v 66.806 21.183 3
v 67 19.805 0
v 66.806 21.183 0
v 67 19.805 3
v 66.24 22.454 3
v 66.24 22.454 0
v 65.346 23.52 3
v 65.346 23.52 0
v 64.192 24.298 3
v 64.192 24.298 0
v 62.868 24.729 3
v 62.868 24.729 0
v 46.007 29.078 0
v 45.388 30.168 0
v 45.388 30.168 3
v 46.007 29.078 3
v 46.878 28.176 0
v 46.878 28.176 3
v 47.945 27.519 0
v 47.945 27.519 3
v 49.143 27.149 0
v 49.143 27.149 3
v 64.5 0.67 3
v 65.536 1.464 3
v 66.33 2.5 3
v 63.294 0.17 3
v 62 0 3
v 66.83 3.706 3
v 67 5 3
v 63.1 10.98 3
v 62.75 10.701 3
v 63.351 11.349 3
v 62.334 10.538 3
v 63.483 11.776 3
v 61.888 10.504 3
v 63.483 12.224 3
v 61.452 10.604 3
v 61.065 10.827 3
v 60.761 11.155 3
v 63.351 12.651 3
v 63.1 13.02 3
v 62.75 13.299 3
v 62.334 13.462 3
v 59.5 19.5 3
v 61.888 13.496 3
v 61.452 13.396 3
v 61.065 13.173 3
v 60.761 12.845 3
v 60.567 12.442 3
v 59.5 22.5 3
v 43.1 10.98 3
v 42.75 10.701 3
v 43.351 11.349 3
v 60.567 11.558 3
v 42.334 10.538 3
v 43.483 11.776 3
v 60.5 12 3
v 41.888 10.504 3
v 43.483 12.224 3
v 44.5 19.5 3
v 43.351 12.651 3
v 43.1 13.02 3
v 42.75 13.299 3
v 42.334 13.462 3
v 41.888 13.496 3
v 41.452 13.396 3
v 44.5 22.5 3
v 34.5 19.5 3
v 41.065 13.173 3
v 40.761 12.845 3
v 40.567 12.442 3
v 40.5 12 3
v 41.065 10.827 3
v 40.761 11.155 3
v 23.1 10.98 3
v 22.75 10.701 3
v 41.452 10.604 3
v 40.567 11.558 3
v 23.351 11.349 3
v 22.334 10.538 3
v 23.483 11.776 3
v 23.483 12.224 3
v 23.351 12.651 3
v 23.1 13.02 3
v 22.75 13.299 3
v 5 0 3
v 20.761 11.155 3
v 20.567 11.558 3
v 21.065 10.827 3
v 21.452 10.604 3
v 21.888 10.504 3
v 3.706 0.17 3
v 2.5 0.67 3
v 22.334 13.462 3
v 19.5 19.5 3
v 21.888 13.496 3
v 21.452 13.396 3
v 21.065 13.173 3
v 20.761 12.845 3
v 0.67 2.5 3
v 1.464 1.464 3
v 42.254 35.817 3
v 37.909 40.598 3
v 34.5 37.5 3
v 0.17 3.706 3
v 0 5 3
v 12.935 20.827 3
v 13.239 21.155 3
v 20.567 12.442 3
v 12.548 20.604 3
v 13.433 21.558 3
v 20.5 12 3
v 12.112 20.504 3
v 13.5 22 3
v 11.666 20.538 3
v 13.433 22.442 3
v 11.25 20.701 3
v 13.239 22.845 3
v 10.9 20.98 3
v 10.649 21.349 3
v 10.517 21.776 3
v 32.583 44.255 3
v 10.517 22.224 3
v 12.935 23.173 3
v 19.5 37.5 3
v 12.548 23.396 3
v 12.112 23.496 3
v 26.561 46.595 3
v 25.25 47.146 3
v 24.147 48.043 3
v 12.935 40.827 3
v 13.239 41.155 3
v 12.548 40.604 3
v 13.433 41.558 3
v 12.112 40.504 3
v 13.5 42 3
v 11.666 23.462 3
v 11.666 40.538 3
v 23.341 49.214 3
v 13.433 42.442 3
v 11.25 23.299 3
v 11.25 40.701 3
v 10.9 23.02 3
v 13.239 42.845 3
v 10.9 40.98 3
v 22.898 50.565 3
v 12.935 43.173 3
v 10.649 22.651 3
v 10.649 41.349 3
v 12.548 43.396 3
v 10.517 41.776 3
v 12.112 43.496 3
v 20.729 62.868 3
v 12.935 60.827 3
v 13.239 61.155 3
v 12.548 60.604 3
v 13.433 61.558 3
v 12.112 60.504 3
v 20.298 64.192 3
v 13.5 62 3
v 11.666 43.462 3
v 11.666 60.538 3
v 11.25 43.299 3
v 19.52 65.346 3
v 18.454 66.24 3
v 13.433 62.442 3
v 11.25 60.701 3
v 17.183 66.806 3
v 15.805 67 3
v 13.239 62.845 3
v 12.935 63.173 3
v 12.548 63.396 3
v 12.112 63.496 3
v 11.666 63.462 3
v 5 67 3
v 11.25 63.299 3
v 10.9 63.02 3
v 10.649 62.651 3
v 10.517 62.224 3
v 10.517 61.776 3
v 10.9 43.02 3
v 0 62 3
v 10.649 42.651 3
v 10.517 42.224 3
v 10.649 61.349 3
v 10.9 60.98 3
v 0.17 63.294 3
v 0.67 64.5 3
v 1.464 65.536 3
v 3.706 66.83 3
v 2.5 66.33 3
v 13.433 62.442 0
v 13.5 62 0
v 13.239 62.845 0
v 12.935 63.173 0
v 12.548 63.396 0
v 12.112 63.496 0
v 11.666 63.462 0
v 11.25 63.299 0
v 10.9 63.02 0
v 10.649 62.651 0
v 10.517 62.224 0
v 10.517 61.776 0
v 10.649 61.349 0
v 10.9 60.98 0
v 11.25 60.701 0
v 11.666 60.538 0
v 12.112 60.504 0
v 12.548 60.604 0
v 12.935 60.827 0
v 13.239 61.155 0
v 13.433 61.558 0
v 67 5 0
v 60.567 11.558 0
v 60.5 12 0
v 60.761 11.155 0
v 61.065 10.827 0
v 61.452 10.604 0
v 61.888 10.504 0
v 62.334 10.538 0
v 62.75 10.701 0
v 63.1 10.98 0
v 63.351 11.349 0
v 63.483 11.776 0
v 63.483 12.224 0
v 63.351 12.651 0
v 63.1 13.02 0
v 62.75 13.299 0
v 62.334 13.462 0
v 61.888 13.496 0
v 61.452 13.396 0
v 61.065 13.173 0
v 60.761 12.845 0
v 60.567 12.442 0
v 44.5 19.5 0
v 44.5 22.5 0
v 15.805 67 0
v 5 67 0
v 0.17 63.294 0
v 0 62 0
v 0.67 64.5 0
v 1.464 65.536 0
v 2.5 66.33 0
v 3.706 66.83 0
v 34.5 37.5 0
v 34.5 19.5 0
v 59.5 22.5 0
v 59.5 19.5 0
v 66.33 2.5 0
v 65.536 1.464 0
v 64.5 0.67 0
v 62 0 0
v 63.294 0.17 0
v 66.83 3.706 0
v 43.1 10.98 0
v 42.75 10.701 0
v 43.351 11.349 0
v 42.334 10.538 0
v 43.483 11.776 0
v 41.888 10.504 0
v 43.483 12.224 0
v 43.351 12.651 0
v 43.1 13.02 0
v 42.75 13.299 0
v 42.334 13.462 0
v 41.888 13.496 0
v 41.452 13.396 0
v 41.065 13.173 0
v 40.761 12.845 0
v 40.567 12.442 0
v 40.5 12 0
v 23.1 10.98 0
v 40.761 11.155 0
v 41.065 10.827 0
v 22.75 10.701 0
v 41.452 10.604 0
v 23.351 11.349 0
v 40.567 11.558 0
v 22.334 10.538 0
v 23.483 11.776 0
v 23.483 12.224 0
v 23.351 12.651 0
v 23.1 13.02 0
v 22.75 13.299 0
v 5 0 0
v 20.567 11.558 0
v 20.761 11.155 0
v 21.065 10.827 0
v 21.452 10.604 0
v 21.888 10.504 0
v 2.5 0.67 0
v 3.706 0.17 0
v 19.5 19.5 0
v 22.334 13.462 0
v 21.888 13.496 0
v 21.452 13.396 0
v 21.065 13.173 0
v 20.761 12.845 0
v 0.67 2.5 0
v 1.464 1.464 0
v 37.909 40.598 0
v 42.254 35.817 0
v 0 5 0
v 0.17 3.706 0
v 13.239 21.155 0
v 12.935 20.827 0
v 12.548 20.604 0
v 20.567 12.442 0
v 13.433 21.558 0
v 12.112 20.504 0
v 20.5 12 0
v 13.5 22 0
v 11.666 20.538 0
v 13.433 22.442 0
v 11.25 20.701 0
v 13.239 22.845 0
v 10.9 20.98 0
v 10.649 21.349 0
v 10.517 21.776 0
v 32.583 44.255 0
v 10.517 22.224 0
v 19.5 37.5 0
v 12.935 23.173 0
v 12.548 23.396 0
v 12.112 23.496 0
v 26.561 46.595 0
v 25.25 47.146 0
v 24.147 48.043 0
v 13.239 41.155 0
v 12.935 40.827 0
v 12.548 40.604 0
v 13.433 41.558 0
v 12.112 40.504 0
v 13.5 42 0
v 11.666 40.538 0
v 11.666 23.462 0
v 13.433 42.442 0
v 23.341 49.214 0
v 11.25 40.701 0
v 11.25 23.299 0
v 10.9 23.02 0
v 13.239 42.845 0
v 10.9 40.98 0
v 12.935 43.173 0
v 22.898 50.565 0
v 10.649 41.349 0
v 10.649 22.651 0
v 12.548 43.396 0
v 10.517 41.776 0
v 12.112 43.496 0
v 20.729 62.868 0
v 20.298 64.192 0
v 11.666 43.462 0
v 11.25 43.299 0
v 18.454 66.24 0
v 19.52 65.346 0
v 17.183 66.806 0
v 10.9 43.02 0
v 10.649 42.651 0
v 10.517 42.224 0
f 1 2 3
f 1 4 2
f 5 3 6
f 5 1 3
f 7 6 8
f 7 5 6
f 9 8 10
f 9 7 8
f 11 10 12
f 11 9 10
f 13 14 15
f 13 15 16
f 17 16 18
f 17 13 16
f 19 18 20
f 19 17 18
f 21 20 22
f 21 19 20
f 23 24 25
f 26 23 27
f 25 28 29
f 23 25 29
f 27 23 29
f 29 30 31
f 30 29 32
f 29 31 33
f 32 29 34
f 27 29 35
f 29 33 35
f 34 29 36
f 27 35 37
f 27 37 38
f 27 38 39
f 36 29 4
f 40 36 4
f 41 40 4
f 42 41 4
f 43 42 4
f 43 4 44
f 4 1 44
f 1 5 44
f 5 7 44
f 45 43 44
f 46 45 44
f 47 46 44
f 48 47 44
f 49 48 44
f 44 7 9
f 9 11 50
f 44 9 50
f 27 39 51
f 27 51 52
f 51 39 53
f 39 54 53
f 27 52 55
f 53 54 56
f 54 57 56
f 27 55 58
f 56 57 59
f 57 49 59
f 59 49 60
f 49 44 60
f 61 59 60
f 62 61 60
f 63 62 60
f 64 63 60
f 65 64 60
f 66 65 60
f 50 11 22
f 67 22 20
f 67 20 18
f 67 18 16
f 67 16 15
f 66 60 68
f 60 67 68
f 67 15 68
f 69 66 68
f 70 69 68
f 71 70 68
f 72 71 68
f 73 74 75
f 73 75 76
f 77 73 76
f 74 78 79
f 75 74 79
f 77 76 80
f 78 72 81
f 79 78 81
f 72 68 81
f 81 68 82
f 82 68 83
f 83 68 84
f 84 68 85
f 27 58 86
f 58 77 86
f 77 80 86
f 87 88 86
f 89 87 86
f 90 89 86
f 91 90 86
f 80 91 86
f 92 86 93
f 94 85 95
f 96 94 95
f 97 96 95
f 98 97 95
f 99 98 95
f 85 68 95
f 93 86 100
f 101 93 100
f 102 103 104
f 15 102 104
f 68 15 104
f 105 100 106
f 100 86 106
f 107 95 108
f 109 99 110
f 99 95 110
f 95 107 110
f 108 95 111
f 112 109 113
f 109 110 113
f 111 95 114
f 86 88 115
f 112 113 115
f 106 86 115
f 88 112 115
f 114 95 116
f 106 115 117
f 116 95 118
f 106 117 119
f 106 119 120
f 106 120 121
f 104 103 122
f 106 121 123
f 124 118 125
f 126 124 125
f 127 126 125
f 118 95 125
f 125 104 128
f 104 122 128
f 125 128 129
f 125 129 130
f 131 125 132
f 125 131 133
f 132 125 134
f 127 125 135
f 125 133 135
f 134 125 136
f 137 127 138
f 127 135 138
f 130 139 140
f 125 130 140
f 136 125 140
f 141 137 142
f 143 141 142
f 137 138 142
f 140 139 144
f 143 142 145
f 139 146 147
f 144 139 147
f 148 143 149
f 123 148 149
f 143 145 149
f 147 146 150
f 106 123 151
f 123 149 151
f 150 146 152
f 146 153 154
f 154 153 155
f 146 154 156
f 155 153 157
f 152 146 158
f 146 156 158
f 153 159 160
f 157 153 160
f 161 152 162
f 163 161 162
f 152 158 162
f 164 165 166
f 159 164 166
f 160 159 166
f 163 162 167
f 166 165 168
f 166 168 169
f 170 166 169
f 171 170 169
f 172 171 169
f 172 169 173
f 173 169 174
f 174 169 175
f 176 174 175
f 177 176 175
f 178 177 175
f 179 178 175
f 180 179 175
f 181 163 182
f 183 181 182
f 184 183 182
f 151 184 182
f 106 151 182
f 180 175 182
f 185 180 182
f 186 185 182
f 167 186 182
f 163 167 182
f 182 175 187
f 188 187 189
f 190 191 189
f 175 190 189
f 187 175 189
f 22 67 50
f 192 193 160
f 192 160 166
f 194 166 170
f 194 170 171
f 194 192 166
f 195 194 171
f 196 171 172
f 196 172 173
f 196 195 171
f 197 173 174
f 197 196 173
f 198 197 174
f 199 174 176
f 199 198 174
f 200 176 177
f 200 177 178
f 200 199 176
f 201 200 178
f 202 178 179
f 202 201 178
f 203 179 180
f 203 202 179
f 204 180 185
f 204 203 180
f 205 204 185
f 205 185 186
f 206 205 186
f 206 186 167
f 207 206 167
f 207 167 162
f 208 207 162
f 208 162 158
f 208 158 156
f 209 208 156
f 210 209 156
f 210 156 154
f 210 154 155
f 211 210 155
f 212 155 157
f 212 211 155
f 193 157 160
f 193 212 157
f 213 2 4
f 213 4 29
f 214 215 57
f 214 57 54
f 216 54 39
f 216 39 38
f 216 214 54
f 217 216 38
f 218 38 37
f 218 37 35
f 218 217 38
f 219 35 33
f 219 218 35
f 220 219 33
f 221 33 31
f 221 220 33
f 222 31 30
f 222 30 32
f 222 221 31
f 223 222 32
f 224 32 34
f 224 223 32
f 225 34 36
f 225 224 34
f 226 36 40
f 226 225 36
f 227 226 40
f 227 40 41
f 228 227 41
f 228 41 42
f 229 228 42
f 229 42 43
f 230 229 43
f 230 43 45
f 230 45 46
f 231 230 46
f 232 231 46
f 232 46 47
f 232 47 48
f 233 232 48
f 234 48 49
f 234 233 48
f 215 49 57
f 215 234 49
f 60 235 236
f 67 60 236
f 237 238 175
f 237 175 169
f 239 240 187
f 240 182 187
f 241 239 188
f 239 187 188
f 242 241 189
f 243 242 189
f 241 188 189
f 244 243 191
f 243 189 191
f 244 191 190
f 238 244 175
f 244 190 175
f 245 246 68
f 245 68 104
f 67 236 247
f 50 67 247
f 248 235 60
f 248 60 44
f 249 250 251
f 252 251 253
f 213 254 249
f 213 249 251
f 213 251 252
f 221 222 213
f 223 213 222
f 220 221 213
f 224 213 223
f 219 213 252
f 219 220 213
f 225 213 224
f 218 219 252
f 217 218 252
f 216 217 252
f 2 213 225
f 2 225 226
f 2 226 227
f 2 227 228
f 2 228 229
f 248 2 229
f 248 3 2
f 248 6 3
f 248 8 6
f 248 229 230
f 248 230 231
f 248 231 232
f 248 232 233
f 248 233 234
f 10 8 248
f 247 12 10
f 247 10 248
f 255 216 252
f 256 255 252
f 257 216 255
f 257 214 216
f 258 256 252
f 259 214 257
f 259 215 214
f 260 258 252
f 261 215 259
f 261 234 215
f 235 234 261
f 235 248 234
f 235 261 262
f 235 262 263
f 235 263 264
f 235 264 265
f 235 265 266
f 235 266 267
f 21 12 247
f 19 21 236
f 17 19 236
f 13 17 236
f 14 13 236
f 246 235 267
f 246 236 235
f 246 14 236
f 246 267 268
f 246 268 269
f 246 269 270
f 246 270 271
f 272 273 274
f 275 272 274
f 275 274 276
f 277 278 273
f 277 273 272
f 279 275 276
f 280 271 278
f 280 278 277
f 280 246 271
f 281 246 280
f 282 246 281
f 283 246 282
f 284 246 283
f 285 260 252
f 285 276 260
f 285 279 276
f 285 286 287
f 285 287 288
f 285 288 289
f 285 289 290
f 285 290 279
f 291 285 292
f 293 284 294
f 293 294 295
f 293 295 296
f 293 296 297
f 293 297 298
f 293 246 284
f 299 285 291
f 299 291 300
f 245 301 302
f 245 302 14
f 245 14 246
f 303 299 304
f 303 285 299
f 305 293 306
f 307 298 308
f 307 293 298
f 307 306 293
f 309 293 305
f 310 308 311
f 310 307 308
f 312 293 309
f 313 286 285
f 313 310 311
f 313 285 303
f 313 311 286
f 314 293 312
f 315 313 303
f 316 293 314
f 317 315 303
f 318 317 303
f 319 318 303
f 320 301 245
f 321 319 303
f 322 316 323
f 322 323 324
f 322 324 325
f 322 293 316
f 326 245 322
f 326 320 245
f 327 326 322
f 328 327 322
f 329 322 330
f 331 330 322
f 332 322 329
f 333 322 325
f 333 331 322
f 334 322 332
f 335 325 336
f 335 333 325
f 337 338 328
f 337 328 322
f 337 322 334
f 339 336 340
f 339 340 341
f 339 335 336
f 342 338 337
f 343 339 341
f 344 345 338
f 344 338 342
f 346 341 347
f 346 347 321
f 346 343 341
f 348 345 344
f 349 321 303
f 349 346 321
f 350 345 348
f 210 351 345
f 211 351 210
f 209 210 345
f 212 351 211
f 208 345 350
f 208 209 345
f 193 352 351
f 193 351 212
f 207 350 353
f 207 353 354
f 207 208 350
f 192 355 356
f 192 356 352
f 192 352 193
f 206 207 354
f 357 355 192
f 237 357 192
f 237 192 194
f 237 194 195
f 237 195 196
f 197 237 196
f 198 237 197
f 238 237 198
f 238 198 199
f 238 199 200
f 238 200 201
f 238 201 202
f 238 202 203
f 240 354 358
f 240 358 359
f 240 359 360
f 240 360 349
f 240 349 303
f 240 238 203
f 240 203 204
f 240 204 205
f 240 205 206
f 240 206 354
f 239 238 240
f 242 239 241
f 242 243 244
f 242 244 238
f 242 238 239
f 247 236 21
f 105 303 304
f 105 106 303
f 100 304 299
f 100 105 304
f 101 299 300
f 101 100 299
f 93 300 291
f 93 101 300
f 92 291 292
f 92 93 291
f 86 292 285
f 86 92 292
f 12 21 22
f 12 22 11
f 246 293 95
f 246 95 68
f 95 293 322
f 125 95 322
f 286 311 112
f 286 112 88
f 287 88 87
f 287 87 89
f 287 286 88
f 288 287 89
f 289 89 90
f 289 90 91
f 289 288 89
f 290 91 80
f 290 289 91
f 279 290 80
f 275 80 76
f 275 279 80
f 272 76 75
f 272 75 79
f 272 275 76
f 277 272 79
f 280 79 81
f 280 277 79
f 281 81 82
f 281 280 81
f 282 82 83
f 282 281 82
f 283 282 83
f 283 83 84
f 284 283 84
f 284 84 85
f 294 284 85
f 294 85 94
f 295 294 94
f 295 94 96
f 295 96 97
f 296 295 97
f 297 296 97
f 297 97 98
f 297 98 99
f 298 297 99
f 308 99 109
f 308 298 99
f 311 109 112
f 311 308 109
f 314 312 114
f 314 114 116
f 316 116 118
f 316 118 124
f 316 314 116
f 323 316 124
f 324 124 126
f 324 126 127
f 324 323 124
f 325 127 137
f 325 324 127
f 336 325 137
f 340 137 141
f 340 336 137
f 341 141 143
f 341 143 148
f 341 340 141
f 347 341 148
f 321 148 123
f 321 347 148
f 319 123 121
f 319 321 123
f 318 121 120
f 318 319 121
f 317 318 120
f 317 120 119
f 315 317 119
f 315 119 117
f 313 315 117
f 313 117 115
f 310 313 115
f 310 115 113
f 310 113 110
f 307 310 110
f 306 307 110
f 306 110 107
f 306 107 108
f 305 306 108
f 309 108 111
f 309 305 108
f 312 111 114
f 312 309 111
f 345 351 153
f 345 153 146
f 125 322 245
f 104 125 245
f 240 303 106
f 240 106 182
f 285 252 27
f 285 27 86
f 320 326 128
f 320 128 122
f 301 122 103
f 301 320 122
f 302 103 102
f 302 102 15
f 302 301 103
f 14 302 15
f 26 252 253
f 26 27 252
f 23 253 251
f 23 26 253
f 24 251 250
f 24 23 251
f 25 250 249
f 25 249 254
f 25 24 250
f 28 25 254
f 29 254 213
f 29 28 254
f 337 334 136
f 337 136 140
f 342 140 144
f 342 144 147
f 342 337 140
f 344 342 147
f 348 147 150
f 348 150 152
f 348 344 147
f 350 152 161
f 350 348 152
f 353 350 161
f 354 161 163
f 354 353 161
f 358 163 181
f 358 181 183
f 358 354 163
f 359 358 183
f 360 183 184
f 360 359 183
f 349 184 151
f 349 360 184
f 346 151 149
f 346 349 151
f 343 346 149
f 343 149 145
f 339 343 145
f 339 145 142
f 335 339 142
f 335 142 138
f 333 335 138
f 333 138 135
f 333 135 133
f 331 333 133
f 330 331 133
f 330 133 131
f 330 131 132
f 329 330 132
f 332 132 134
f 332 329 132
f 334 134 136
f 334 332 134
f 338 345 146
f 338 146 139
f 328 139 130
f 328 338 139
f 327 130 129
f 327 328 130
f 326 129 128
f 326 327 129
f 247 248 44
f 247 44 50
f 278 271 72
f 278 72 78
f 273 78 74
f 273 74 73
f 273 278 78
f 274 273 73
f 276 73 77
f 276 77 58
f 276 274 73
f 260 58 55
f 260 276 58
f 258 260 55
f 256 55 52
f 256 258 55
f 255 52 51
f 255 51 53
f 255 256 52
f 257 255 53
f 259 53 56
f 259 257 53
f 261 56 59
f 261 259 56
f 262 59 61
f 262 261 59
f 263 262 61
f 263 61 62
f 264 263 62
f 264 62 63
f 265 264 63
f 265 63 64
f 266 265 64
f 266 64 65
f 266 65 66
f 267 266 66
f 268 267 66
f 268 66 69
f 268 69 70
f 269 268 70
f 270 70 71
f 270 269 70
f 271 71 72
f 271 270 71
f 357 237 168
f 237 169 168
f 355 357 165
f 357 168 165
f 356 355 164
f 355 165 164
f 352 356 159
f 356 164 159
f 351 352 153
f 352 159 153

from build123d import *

# Parameters (mm, degrees)
SKETCH_1_R      = 1.5
SKETCH_1_W      = 15
SKETCH_1_H      = 18
SKETCH_1_H_2    = 3
EXTRUDE_1_DEPTH = 3
FILLET_1_R      = 5


with BuildPart() as part:
    # 草图1 → 凸台-拉伸1 (new body)
    with BuildSketch(Plane.XY):
        with BuildLine():
            Line((0, 0), (0, 67))
            Line((0, 67), (20, 67))
            Line((20, 67), (22.897896607, 50.56521166))
            ThreePointArc((22.897896607, 50.56521166), (24.147168803, 48.042864005), (26.561036073, 46.595050647))
            ThreePointArc((26.561036073, 46.595050647), (37.908605389, 40.597944156), (45.388192925, 30.167777045))
            ThreePointArc((45.388192925, 30.167777045), (46.877900379, 28.176180142), (49.14284363, 27.148698467))
            Line((49.14284363, 27.148698467), (67, 24))
            Line((67, 24), (67, 0))
            Line((67, 0), (0, 0))
        make_face()
        with Locations((12, 62)):
            Circle(SKETCH_1_R, mode=Mode.SUBTRACT)
        with Locations((12, 42)):
            Circle(SKETCH_1_R, mode=Mode.SUBTRACT)
        with Locations((12, 22)):
            Circle(SKETCH_1_R, mode=Mode.SUBTRACT)
        with Locations(Location((62, 12, 0), (0, 0, 180))):
            Circle(SKETCH_1_R, mode=Mode.SUBTRACT)
        with Locations(Location((42, 12, 0), (0, 0, 180))):
            Circle(SKETCH_1_R, mode=Mode.SUBTRACT)
        with Locations(Location((22, 12, 0), (0, 0, 180))):
            Circle(SKETCH_1_R, mode=Mode.SUBTRACT)
        with Locations((27, 28.5)):
            Rectangle(SKETCH_1_W, SKETCH_1_H, mode=Mode.SUBTRACT)
        with Locations((52, 21)):
            Rectangle(SKETCH_1_W, SKETCH_1_H_2, mode=Mode.SUBTRACT)
    extrude(amount=EXTRUDE_1_DEPTH)

    # 圆角1
    fillet_1_edges = [part.edges().sort_by_distance(p)[0] for p in [
        (0, 0, 1.5),
        (0, 67, 1.5),
        (20, 67, 1.5),
        (67, 24, 1.5),
        (67, 0, 1.5),
    ]]
    fillet(fillet_1_edges, radius=FILLET_1_R)


solid = part.part
